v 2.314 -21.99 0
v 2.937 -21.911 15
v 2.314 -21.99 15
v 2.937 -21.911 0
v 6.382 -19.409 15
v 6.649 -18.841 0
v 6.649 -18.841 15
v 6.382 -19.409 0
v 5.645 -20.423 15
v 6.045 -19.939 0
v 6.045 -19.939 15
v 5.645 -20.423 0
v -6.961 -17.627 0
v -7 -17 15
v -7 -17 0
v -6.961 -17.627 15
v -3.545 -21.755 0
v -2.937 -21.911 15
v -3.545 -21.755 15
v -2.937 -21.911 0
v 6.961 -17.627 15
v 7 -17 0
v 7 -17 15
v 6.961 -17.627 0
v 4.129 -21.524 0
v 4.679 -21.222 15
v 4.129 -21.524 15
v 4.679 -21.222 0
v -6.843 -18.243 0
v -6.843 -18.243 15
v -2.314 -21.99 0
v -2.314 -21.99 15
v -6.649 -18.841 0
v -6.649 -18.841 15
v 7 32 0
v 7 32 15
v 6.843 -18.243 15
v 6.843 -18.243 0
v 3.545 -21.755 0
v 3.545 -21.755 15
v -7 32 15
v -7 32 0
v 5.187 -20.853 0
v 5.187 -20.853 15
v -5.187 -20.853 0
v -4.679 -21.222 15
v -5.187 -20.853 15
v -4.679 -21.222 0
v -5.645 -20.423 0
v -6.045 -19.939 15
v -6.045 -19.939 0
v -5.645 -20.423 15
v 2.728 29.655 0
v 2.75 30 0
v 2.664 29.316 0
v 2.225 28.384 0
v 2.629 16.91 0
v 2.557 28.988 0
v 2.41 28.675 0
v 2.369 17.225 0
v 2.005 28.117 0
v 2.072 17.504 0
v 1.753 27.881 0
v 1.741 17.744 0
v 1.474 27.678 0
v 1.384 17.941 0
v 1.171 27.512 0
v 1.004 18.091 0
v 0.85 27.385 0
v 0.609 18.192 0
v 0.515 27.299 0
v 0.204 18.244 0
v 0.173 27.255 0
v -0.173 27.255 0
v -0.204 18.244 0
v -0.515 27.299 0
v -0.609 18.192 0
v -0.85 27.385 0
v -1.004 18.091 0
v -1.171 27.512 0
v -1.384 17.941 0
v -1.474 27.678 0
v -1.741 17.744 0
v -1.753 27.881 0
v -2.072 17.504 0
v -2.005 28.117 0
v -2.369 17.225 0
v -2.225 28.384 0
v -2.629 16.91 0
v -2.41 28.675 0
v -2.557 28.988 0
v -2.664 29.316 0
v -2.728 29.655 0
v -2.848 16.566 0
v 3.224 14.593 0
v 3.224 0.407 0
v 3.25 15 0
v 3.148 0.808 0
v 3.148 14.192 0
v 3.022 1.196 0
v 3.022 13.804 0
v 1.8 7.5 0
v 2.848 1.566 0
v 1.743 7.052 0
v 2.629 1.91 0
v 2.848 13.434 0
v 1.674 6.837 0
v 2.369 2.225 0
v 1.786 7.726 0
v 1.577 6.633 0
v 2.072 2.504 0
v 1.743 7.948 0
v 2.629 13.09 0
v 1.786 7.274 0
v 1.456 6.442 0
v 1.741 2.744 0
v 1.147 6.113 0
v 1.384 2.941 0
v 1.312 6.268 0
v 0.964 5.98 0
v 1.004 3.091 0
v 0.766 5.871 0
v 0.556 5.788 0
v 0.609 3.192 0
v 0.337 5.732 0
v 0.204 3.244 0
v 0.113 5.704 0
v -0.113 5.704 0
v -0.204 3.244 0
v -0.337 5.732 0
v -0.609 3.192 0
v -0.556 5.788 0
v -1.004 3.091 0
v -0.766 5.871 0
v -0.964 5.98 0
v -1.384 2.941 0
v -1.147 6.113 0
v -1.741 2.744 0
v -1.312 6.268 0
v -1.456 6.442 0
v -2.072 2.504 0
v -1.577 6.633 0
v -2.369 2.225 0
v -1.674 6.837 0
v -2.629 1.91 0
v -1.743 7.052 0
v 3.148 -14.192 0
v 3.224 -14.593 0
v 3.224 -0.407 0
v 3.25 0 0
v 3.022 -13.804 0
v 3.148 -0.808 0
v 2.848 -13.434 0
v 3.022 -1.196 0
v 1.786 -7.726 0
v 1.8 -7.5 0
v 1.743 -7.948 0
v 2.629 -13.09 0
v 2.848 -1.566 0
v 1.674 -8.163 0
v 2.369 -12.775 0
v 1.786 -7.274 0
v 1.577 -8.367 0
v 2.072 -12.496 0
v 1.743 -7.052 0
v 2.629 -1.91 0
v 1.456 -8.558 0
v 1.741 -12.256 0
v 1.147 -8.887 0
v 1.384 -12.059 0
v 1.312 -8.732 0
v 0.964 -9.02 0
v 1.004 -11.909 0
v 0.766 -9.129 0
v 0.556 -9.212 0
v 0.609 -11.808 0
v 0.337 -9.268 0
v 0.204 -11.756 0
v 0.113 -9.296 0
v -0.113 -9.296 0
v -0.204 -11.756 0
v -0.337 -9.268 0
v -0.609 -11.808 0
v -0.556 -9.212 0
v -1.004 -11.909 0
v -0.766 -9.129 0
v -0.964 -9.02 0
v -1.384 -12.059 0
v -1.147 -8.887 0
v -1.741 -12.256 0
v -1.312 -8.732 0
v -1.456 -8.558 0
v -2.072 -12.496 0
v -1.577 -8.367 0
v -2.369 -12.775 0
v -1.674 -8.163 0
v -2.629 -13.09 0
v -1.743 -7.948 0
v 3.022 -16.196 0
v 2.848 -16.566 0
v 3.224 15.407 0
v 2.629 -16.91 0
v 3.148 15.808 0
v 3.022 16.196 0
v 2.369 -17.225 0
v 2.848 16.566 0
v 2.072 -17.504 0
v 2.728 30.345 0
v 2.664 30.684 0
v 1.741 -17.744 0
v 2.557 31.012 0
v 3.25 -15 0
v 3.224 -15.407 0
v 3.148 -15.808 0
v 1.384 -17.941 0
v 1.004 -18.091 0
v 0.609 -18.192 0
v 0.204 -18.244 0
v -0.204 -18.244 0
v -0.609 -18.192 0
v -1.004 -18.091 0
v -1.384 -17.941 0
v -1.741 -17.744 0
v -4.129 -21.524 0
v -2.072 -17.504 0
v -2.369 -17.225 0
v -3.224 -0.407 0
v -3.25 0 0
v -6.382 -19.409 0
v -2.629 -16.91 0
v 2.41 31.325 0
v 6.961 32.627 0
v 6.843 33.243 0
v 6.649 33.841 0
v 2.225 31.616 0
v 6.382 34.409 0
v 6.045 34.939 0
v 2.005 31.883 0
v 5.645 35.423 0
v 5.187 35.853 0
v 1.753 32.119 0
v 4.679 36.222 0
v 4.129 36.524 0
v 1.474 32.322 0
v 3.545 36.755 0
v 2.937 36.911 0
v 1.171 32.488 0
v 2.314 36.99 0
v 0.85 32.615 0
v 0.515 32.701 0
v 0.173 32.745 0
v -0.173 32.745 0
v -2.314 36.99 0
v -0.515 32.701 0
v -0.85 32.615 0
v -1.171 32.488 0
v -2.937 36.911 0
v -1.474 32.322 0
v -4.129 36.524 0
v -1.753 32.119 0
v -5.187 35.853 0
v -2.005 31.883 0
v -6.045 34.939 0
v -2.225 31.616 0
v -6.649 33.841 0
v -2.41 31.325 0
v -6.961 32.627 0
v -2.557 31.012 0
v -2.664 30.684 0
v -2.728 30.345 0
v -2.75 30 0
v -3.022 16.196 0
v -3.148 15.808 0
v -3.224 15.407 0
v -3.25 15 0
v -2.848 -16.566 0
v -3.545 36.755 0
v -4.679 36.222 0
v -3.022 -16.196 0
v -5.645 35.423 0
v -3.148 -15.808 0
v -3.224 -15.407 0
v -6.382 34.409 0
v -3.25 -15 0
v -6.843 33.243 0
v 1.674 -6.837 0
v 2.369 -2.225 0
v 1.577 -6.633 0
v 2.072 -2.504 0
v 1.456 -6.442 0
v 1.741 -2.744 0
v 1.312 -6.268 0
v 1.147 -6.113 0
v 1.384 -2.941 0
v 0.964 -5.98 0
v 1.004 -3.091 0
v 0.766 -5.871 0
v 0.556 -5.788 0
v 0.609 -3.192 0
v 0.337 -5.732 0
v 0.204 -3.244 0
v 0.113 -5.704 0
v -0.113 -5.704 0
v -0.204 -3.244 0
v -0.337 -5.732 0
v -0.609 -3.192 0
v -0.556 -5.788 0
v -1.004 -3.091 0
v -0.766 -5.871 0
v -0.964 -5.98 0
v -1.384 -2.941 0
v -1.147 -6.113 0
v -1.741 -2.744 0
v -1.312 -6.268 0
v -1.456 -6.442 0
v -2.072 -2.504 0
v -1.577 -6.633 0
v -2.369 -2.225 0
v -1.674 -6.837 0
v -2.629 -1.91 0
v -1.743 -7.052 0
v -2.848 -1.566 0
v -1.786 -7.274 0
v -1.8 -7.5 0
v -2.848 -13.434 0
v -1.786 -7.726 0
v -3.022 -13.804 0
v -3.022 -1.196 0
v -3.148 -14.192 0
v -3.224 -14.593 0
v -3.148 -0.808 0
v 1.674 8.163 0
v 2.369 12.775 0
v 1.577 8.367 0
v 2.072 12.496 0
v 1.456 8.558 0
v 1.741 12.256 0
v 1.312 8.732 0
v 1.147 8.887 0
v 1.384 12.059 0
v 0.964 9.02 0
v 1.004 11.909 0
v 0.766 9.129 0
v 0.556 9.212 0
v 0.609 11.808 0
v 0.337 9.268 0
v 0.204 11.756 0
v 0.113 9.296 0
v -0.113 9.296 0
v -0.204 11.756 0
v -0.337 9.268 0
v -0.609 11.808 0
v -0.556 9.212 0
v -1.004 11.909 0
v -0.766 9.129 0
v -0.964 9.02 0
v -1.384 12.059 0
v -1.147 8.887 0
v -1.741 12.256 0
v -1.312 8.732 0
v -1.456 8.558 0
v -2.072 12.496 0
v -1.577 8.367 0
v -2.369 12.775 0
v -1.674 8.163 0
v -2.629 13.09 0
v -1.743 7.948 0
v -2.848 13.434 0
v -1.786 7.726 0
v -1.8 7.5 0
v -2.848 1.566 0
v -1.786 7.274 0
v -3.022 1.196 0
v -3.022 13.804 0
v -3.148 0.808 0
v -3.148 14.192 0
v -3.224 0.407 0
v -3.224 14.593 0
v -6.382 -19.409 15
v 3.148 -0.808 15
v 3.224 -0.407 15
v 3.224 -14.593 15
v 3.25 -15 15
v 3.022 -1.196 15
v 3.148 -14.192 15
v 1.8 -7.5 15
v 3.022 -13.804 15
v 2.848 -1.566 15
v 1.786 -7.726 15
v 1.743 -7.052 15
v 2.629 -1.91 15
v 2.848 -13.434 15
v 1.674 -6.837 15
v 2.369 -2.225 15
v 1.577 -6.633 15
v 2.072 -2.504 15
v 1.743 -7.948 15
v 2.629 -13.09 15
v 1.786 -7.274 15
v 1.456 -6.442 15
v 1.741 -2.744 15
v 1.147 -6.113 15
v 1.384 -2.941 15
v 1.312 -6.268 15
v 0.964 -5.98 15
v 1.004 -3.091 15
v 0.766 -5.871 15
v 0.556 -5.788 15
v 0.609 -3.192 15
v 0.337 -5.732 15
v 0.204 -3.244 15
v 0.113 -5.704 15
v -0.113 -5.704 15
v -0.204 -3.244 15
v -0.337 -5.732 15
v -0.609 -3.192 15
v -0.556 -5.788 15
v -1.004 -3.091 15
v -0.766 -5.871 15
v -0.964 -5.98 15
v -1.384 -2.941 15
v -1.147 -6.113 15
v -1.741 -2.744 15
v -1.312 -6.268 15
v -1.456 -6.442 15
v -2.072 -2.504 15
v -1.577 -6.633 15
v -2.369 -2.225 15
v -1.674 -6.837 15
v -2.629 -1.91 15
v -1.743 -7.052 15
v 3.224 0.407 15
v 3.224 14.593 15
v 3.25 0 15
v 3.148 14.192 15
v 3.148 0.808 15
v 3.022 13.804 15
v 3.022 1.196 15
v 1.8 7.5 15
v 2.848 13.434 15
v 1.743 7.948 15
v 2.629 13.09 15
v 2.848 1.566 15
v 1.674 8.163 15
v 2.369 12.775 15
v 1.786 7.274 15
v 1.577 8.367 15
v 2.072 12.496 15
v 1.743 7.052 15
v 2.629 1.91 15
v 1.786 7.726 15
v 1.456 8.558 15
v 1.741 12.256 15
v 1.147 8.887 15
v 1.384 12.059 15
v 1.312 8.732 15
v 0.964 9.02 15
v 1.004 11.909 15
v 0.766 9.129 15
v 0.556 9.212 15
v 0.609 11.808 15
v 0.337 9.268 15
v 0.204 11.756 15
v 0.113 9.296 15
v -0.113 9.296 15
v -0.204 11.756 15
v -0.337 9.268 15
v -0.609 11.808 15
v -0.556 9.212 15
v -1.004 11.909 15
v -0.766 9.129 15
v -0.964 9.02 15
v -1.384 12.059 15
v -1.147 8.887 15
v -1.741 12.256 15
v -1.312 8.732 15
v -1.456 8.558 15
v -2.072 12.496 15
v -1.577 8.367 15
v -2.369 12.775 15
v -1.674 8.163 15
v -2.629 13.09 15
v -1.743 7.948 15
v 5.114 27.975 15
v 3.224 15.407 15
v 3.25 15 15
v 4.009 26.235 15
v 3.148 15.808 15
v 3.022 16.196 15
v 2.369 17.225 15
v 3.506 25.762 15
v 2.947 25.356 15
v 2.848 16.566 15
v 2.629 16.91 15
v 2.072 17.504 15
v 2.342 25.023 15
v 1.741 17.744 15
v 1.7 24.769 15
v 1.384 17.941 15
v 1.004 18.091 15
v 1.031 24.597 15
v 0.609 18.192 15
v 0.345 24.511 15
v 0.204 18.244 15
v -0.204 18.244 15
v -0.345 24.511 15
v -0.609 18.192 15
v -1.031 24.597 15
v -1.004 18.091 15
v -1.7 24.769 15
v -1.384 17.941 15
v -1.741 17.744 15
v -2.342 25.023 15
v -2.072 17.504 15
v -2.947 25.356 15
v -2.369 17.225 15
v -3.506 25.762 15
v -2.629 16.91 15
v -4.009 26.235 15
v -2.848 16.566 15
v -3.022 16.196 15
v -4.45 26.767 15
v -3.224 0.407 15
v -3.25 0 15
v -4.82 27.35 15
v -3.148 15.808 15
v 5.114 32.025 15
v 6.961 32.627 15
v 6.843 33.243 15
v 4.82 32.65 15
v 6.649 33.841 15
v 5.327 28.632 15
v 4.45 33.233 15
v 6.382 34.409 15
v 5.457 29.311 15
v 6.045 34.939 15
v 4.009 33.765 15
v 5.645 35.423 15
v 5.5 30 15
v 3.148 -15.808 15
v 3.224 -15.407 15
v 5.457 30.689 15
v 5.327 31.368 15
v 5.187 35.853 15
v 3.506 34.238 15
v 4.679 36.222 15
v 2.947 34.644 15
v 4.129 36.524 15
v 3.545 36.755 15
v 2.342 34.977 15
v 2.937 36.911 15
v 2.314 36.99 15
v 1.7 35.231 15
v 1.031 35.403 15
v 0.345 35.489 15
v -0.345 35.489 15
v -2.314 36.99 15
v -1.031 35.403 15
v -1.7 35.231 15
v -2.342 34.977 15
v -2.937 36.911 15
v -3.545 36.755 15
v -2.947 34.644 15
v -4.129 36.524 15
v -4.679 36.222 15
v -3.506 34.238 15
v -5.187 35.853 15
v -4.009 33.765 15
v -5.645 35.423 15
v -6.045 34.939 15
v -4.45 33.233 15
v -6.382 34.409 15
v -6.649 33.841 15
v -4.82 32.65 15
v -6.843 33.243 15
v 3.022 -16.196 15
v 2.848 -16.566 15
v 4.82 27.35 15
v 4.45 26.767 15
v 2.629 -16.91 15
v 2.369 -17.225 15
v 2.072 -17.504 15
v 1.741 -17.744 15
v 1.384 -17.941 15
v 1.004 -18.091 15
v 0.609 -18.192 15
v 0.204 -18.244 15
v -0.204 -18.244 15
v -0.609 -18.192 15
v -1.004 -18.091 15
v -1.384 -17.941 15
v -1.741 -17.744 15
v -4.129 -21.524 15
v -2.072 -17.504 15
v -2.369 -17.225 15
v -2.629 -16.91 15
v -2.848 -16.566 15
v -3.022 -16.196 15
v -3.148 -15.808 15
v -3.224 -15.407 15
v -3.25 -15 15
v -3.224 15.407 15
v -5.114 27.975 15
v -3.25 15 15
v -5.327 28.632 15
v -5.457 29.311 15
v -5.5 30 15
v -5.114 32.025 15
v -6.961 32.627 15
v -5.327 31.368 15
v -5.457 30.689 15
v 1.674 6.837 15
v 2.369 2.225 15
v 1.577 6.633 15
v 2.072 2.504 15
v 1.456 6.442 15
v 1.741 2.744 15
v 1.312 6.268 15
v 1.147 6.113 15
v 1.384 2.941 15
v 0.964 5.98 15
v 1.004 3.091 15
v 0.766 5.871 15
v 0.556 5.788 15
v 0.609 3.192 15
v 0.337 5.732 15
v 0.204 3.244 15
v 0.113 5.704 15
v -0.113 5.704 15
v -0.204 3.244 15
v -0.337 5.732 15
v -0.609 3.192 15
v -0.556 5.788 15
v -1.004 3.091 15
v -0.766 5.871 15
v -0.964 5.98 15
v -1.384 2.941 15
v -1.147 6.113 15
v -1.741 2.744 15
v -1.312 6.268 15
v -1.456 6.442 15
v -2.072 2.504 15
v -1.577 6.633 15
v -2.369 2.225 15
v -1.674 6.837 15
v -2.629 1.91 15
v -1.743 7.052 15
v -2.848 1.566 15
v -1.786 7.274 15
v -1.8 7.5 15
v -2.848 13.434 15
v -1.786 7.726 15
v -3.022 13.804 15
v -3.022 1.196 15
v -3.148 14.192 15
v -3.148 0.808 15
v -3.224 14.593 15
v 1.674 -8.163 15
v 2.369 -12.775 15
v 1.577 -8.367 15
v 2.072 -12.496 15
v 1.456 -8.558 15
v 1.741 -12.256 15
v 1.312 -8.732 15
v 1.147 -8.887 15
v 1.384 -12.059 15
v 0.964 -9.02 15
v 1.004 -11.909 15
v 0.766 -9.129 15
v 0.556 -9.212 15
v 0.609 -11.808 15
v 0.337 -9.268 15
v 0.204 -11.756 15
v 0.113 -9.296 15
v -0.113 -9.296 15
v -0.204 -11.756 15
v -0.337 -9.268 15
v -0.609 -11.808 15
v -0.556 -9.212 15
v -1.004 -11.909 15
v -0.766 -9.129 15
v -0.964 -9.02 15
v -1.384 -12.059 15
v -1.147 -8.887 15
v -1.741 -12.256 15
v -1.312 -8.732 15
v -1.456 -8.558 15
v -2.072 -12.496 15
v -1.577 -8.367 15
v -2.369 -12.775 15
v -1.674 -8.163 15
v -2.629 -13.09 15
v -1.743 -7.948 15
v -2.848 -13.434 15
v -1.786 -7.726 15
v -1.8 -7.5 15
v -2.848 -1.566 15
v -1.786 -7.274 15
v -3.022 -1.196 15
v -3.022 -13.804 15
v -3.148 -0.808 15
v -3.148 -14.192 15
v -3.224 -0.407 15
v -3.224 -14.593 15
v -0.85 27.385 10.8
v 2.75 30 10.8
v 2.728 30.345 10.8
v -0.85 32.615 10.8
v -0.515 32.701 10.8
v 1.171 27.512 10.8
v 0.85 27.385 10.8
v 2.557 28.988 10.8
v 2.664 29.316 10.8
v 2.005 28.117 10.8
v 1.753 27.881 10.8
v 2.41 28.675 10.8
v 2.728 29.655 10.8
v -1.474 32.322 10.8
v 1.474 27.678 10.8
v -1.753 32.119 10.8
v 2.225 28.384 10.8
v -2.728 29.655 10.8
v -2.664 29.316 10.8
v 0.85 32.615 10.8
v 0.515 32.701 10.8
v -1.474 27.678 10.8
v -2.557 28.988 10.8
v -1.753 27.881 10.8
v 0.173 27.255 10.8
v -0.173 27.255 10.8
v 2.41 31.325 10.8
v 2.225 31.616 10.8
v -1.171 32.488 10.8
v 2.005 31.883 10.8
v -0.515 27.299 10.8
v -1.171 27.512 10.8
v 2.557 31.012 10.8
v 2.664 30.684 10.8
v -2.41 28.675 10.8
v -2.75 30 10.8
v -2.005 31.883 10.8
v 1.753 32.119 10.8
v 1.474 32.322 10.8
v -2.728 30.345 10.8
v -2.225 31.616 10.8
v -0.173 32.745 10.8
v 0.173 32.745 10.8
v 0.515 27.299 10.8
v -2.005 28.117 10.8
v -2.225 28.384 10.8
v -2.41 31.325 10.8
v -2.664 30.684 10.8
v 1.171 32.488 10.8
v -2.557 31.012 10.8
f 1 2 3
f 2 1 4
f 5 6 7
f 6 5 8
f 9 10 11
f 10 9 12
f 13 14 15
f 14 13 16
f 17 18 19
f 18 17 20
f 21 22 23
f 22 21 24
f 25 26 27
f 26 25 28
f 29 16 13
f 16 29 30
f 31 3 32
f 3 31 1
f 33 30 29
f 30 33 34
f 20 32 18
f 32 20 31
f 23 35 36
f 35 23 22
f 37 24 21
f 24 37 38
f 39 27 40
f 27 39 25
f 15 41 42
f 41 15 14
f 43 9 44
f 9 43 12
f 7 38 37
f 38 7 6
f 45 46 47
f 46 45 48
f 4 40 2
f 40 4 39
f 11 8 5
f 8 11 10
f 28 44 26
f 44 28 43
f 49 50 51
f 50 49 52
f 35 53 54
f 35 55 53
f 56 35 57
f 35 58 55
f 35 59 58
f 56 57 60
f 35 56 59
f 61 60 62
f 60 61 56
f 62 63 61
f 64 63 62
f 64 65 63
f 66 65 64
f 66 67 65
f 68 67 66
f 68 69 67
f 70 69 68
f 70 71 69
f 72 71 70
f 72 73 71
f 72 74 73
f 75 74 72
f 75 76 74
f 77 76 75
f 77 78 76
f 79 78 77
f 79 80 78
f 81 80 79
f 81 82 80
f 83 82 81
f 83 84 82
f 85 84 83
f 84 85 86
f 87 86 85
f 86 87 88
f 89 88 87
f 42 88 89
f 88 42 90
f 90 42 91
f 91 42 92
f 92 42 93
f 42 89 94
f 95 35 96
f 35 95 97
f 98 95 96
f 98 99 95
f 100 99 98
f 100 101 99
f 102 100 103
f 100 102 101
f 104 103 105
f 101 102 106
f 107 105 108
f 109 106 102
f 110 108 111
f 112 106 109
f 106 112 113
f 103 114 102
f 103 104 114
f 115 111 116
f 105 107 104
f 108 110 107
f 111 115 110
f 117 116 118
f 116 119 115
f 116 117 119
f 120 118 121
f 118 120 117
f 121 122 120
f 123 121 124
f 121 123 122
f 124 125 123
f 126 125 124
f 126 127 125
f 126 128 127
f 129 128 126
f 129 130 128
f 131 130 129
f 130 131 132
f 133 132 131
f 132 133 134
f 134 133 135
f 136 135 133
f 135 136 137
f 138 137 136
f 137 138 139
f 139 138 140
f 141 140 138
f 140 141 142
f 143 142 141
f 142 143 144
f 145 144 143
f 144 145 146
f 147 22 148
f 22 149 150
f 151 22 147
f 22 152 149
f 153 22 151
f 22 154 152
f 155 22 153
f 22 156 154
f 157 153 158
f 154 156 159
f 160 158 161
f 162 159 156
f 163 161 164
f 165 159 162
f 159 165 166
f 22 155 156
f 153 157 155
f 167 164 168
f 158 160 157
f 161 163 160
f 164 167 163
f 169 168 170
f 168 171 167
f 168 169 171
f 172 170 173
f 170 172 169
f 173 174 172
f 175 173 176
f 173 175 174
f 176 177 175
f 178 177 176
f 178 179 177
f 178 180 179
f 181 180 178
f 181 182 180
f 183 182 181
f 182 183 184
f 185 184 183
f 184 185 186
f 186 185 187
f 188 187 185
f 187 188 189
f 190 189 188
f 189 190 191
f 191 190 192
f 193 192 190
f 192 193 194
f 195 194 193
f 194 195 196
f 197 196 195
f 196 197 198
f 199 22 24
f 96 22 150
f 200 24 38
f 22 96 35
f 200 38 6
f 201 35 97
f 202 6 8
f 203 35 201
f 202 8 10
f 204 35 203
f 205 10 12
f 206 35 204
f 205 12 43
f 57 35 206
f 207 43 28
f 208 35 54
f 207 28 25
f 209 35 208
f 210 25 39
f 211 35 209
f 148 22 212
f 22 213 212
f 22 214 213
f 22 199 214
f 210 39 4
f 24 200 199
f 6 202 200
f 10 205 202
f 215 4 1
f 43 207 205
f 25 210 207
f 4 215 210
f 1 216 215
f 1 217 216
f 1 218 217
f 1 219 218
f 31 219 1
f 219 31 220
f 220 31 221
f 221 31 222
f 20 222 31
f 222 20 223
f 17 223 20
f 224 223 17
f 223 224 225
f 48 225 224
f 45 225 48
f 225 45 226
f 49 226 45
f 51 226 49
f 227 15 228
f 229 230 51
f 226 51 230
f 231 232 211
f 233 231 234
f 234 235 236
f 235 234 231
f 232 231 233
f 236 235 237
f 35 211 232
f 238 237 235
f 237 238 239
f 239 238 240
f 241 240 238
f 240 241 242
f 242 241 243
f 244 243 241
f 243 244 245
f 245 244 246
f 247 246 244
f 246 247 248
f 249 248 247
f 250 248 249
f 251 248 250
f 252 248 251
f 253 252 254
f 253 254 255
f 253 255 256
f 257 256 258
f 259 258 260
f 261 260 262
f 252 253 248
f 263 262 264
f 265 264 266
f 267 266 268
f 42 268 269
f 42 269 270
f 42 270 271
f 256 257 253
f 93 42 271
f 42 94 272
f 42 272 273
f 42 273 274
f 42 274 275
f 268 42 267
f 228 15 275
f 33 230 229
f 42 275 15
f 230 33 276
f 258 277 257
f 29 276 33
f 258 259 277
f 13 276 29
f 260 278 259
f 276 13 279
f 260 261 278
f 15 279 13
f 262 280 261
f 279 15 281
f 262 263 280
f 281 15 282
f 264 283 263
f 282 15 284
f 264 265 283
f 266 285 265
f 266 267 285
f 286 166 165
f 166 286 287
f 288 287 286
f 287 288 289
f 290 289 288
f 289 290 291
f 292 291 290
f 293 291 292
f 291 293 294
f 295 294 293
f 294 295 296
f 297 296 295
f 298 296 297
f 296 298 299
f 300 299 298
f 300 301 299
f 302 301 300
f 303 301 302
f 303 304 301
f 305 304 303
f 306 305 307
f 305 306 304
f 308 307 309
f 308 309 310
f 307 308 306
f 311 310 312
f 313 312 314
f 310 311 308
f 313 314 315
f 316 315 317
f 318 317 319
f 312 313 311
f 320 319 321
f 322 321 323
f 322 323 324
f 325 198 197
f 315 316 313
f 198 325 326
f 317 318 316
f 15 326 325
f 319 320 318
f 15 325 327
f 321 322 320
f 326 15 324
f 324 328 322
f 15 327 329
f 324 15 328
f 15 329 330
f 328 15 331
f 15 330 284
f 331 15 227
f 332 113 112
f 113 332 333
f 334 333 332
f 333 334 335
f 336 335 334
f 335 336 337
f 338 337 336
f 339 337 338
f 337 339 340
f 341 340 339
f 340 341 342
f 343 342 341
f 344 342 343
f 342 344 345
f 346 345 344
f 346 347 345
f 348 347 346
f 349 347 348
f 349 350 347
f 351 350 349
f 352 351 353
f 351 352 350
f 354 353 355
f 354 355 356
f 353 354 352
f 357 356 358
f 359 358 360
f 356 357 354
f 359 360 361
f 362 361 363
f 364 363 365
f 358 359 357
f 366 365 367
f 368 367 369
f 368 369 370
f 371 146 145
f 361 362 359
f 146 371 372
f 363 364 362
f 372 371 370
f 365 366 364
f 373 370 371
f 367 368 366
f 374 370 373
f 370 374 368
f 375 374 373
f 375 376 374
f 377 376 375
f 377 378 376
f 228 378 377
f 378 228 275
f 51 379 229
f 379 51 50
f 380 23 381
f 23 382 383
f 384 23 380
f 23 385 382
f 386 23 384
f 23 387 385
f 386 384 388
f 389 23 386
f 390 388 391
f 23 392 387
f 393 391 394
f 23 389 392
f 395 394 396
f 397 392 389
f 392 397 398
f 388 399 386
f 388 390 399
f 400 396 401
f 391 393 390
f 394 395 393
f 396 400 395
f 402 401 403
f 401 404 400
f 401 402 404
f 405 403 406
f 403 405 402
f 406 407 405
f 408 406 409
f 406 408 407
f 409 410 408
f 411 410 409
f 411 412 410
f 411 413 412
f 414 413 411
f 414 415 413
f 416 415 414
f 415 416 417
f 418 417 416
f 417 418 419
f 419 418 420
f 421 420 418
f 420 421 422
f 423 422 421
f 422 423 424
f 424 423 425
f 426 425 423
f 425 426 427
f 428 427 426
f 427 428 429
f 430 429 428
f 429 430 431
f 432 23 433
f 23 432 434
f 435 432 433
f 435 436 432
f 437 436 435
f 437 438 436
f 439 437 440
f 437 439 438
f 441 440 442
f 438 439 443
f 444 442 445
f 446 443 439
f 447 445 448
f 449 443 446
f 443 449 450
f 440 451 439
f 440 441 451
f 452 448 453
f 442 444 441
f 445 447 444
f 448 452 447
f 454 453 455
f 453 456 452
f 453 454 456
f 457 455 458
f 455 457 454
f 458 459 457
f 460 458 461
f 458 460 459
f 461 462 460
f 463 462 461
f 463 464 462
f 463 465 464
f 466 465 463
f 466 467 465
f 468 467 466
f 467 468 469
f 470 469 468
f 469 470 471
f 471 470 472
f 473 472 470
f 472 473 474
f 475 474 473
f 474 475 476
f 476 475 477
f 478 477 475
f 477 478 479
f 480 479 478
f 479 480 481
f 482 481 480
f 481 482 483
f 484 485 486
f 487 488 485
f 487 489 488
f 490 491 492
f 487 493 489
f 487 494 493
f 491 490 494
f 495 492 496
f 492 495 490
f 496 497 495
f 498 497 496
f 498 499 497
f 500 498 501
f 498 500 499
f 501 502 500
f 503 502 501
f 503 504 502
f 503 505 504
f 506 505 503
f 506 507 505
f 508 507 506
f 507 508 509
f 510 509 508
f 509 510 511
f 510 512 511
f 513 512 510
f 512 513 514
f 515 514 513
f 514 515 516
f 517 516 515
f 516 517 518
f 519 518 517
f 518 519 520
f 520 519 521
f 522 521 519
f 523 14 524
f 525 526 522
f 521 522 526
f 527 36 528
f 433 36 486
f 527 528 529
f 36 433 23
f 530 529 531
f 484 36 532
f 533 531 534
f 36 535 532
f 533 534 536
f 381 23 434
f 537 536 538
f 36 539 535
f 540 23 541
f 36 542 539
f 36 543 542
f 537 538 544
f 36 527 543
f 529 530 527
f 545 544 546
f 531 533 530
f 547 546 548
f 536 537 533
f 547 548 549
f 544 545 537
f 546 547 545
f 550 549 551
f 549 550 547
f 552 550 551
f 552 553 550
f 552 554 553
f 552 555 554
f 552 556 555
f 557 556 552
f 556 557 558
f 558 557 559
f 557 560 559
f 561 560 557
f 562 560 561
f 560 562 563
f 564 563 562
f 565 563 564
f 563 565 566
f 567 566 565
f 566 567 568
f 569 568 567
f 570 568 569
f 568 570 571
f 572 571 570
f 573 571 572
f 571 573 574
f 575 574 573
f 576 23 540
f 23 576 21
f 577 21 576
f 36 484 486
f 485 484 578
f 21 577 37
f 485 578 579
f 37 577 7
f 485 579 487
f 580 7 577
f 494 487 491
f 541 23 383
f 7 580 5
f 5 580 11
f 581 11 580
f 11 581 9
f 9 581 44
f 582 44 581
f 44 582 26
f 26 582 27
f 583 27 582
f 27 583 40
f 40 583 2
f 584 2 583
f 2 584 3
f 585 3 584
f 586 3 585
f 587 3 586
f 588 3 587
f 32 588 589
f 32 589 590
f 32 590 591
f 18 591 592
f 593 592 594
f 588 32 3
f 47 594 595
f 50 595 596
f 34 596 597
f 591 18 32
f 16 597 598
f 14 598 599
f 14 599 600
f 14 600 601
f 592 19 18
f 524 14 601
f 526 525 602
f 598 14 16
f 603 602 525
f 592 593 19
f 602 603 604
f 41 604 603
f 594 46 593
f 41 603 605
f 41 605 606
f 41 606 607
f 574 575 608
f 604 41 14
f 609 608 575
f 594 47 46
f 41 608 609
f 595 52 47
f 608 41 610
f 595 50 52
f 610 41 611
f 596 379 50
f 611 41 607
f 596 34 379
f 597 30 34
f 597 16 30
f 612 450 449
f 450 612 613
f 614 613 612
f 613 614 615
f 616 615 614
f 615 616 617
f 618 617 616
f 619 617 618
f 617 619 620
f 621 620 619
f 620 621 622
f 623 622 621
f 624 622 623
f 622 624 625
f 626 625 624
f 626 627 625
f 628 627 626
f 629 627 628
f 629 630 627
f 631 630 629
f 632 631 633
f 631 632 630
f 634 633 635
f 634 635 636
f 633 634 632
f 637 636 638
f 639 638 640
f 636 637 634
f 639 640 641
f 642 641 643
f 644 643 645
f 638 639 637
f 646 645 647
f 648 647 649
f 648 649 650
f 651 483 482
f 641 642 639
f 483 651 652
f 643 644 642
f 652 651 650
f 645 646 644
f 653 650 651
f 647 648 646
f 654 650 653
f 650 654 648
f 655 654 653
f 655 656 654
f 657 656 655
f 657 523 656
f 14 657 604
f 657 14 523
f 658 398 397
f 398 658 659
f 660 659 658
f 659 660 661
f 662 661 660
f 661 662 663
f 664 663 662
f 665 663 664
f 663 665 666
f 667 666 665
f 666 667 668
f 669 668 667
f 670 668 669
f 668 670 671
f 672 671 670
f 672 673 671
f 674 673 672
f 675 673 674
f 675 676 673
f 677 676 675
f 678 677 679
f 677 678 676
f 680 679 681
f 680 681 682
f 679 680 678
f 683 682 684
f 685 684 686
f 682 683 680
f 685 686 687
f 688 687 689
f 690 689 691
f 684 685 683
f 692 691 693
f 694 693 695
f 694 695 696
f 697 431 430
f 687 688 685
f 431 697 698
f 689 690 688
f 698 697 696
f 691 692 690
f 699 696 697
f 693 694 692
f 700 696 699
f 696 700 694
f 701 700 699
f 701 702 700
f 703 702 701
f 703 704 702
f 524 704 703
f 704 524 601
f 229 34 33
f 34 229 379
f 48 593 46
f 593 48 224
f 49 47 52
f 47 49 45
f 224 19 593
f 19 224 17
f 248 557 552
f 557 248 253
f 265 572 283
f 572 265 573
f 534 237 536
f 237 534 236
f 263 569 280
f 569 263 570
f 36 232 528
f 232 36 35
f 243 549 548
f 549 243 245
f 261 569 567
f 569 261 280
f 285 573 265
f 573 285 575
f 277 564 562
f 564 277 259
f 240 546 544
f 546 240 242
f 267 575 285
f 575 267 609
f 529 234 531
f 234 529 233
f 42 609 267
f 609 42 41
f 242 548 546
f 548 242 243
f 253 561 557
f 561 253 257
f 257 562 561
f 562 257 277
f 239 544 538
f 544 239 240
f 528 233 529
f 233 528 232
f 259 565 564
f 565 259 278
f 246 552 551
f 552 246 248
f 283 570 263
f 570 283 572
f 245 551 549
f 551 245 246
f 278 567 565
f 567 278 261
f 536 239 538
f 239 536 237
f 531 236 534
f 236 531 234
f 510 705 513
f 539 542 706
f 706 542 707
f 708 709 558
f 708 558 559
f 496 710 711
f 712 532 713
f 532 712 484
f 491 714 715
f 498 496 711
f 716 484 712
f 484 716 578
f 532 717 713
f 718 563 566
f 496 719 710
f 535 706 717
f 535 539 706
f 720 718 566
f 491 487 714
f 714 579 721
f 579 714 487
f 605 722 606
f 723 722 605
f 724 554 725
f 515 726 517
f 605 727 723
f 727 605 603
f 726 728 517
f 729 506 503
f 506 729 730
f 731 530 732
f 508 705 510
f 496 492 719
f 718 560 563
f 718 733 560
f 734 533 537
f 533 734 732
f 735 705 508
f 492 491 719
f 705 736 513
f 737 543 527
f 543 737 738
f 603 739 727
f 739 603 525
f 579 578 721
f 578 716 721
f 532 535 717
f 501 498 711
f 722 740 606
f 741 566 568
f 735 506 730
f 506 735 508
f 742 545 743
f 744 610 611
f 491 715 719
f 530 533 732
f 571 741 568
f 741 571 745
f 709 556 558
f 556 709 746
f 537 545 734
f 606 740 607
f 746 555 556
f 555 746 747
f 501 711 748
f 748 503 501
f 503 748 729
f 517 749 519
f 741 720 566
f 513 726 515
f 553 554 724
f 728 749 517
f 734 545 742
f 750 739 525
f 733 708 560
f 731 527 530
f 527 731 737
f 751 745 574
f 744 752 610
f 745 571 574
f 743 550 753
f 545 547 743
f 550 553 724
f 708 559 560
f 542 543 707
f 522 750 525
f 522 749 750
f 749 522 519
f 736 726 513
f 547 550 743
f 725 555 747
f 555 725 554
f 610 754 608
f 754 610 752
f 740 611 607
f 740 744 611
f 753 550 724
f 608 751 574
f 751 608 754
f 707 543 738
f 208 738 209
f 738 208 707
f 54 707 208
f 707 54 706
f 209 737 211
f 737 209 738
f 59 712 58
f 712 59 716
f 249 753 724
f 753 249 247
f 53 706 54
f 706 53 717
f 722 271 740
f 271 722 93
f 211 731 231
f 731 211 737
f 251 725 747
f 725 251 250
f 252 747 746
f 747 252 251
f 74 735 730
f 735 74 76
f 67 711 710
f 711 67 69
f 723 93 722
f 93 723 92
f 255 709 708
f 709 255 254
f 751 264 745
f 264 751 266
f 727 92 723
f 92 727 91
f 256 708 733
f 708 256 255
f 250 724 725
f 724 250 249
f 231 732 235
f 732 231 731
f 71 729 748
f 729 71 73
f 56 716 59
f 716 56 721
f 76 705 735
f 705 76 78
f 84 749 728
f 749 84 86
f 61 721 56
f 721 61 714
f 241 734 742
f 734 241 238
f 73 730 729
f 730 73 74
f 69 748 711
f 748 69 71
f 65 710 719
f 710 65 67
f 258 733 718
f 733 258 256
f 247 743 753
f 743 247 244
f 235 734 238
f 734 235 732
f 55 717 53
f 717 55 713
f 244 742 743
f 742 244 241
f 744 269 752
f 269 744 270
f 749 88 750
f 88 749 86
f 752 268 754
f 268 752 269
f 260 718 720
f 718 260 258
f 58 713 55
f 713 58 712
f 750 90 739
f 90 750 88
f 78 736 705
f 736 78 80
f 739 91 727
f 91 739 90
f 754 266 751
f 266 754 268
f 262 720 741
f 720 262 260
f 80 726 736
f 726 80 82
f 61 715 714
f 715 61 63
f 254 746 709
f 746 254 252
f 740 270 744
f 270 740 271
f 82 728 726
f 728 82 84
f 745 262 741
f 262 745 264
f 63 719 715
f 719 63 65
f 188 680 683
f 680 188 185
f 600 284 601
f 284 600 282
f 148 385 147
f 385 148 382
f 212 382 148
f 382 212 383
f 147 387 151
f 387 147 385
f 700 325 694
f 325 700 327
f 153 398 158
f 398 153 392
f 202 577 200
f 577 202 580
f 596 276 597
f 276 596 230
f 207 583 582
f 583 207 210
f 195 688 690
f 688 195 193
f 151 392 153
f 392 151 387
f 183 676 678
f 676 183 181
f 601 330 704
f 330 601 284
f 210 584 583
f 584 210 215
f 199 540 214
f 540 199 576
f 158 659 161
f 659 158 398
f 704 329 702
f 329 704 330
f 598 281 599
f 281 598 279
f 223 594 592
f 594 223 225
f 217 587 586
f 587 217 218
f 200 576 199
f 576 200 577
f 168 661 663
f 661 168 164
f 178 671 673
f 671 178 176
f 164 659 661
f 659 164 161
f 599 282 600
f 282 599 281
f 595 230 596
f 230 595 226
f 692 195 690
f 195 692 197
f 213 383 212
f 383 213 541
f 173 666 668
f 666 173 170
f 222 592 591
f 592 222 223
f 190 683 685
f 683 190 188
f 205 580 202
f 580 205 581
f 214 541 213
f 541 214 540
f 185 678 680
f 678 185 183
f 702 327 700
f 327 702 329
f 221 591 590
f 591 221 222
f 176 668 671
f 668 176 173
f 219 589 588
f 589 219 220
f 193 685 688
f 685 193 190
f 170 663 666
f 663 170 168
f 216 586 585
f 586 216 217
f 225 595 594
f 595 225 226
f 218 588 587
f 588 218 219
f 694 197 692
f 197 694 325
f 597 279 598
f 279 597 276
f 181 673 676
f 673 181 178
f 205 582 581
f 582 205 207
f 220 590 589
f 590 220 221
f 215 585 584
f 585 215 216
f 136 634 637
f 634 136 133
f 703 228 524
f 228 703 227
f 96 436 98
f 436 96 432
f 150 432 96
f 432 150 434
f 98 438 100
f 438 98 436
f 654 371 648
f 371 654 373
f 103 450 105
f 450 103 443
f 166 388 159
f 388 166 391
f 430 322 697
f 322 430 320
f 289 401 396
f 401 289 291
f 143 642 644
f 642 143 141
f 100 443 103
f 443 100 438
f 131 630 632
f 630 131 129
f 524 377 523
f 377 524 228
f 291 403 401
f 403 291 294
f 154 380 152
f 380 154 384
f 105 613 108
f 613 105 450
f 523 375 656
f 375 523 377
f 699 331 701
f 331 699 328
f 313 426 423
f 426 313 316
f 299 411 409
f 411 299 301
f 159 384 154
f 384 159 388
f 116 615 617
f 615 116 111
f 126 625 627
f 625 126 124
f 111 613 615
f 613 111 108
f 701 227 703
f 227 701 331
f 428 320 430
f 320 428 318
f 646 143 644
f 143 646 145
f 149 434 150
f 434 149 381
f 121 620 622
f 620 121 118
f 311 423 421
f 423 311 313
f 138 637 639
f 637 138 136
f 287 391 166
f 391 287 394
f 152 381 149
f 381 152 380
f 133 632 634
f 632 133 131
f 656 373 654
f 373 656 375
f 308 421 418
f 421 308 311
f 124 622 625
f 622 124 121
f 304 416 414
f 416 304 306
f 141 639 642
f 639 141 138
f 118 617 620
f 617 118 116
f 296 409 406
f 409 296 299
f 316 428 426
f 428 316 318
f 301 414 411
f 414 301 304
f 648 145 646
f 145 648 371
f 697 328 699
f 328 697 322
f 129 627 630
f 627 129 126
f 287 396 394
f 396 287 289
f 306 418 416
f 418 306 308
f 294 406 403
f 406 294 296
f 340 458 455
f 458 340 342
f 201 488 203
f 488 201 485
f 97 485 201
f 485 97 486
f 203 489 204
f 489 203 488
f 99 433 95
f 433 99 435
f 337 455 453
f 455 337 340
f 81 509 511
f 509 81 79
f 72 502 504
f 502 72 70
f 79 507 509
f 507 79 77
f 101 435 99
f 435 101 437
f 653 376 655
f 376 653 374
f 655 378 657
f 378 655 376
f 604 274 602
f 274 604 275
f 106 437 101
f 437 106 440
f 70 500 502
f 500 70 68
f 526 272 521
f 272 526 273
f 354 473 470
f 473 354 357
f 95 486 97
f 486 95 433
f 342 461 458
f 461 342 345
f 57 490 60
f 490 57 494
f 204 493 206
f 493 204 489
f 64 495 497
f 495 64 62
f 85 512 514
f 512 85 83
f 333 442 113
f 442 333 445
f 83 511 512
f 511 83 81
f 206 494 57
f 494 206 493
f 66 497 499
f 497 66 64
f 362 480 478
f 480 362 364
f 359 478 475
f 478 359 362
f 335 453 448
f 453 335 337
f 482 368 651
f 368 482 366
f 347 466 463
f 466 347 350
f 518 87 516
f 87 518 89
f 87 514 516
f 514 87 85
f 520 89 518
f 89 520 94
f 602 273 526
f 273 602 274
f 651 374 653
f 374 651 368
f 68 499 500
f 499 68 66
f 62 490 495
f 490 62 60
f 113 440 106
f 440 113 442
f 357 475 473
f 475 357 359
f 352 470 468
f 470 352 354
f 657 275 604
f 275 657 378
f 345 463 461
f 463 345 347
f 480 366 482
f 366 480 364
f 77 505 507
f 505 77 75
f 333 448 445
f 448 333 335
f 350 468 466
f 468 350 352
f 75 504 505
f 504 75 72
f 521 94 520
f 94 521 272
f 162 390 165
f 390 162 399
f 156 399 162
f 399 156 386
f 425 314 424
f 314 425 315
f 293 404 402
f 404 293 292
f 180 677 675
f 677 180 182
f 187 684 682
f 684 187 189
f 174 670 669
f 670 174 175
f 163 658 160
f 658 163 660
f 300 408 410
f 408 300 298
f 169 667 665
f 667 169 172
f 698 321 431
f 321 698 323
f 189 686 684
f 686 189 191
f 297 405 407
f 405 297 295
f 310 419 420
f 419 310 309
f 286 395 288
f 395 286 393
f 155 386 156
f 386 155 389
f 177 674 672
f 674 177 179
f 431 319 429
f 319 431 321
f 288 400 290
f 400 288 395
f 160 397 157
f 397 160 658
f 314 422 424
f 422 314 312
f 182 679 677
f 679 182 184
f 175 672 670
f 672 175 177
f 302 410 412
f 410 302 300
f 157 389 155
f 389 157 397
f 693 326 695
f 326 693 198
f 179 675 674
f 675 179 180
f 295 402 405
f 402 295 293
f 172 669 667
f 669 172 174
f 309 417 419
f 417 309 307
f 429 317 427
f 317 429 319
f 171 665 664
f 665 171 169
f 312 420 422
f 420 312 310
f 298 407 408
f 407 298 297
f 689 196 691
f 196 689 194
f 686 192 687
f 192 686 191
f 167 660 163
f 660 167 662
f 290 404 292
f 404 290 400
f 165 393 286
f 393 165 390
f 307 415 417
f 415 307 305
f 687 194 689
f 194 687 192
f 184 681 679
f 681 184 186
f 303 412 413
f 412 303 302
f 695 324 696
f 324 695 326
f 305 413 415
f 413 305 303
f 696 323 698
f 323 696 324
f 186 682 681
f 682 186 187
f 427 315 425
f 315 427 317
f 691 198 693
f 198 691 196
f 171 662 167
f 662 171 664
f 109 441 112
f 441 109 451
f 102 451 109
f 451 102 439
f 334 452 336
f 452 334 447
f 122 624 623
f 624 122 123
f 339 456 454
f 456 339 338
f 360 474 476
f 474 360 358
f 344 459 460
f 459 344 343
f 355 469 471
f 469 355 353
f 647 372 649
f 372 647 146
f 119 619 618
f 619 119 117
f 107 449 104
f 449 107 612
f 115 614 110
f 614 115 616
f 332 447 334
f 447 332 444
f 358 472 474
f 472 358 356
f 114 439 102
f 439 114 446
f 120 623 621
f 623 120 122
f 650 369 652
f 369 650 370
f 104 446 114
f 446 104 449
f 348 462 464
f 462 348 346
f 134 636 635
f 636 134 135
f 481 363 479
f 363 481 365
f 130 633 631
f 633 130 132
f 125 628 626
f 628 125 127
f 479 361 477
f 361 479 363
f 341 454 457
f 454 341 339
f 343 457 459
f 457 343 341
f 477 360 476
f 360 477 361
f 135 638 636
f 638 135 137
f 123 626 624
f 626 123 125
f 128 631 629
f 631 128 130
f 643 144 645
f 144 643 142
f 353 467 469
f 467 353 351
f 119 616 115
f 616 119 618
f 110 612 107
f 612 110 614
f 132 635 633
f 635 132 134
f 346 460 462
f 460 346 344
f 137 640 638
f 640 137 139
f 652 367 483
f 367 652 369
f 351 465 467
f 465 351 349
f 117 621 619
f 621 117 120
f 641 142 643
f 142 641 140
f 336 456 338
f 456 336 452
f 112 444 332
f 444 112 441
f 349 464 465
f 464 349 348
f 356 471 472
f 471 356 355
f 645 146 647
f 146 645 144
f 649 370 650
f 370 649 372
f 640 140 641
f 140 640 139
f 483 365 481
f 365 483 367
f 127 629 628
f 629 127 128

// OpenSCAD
$fn = 50;


difference() {
	union() {
		hull() {
			translate(v = [-2.0000000000, 17.0000000000, 0]) {
				cylinder(h = 15, r = 5);
			}
			translate(v = [2.0000000000, 17.0000000000, 0]) {
				cylinder(h = 15, r = 5);
			}
			translate(v = [-2.0000000000, -17.0000000000, 0]) {
				cylinder(h = 15, r = 5);
			}
			translate(v = [2.0000000000, -17.0000000000, 0]) {
				cylinder(h = 15, r = 5);
			}
		}
		translate(v = [0.0000000000, 22.5000000000, 0]) {
			hull() {
				translate(v = [-2.0000000000, 9.5000000000, 0]) {
					cylinder(h = 15, r = 5);
				}
				translate(v = [2.0000000000, 9.5000000000, 0]) {
					cylinder(h = 15, r = 5);
				}
				translate(v = [-2.0000000000, -9.5000000000, 0]) {
					cylinder(h = 15, r = 5);
				}
				translate(v = [2.0000000000, -9.5000000000, 0]) {
					cylinder(h = 15, r = 5);
				}
			}
		}
		translate(v = [0.0000000000, 22.5000000000, 0]) {
			hull() {
				translate(v = [-2.0000000000, 9.5000000000, 0]) {
					cylinder(h = 15, r = 5);
				}
				translate(v = [2.0000000000, 9.5000000000, 0]) {
					cylinder(h = 15, r = 5);
				}
				translate(v = [-2.0000000000, -9.5000000000, 0]) {
					cylinder(h = 15, r = 5);
				}
				translate(v = [2.0000000000, -9.5000000000, 0]) {
					cylinder(h = 15, r = 5);
				}
			}
		}
	}
	union() {
		translate(v = [0.0000000000, 30.0000000000, 15]) {
			rotate(a = [0, 0, 0]) {
				difference() {
					union() {
						#translate(v = [0, 0, -15.0000000000]) {
							cylinder(h = 15, r = 2.2500000000);
						}
						#translate(v = [0, 0, -4.2000000000]) {
							cylinder(h = 4.2000000000, r1 = 2.7500000000, r2 = 5.5000000000);
						}
						#translate(v = [0, 0, -15.0000000000]) {
							cylinder(h = 15, r = 2.7500000000);
						}
						#translate(v = [0, 0, -15.0000000000]) {
							cylinder(h = 15, r = 2.2500000000);
						}
					}
					union();
				}
			}
		}
		translate(v = [0.0000000000, 30.0000000000, 15]) {
			rotate(a = [0, 0, 0]) {
				difference() {
					union() {
						#translate(v = [0, 0, -15.0000000000]) {
							cylinder(h = 15, r = 2.2500000000);
						}
						#translate(v = [0, 0, -4.2000000000]) {
							cylinder(h = 4.2000000000, r1 = 2.7500000000, r2 = 5.5000000000);
						}
						#translate(v = [0, 0, -15.0000000000]) {
							cylinder(h = 15, r = 2.7500000000);
						}
						#translate(v = [0, 0, -15.0000000000]) {
							cylinder(h = 15, r = 2.2500000000);
						}
					}
					union();
				}
			}
		}
		translate(v = [0.0000000000, -15.0000000000, 0]) {
			translate(v = [0, 0, -100]) {
				cylinder(h = 200, r = 3.2500000000);
			}
		}
		translate(v = [0, 0, -100]) {
			cylinder(h = 200, r = 3.2500000000);
		}
		translate(v = [0.0000000000, 15.0000000000, 0]) {
			translate(v = [0, 0, -100]) {
				cylinder(h = 200, r = 3.2500000000);
			}
		}
		translate(v = [0.0000000000, -15.0000000000, 0]) {
			translate(v = [0, 0, -100]) {
				cylinder(h = 200, r = 1.8000000000);
			}
		}
		translate(v = [0.0000000000, -7.5000000000, 0]) {
			translate(v = [0, 0, -100]) {
				cylinder(h = 200, r = 1.8000000000);
			}
		}
		translate(v = [0, 0, -100]) {
			cylinder(h = 200, r = 1.8000000000);
		}
		translate(v = [0.0000000000, 7.5000000000, 0]) {
			translate(v = [0, 0, -100]) {
				cylinder(h = 200, r = 1.8000000000);
			}
		}
		translate(v = [0.0000000000, 15.0000000000, 0]) {
			translate(v = [0, 0, -100]) {
				cylinder(h = 200, r = 1.8000000000);
			}
		}
	}
}
